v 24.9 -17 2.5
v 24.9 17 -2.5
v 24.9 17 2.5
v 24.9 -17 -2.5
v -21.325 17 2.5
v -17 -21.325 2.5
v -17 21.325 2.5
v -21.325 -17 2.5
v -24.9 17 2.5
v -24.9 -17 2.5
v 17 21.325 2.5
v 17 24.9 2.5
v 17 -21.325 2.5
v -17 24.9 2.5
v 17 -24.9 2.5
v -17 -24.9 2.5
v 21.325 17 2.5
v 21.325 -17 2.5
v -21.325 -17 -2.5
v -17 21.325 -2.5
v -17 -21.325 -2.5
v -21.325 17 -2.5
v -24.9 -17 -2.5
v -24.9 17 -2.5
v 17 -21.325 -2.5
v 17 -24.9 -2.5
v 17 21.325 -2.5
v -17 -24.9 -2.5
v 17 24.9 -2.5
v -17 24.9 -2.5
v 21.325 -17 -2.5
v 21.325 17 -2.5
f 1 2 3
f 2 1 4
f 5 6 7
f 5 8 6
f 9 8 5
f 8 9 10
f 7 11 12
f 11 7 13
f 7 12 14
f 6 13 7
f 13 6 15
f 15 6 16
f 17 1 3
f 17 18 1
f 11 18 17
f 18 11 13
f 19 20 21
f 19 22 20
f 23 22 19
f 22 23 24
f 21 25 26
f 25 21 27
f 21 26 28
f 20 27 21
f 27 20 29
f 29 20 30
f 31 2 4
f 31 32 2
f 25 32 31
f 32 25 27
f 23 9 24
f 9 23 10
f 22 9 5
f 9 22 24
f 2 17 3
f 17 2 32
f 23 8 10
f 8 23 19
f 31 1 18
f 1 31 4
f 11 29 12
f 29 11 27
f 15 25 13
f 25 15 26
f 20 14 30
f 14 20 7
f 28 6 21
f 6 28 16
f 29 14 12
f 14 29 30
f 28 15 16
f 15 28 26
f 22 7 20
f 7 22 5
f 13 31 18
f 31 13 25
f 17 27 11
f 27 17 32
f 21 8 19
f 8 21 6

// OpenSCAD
//Cube insert template

/* [Hiden] */
a = 49.8;
b = 33.6;
c = 6.28;
d = 53.8;
h = 5; //holder height
IM_offset = 0.2;

module CubeInsert () {
    difference(){
        union() {   //basic insert design
            cube([a,b+2*IM_offset,h], center=true);
            cube([b+2*IM_offset,a,h], center=true);
            rotate(a=[0,0,45]){
                cube([c,d+2*IM_offset,h], center=true);
            }
            rotate(a=[0,0,-45]){
                cube([c,d+2*IM_offset,h], center=true);
            }
        }
    }
}

CubeInsert();
